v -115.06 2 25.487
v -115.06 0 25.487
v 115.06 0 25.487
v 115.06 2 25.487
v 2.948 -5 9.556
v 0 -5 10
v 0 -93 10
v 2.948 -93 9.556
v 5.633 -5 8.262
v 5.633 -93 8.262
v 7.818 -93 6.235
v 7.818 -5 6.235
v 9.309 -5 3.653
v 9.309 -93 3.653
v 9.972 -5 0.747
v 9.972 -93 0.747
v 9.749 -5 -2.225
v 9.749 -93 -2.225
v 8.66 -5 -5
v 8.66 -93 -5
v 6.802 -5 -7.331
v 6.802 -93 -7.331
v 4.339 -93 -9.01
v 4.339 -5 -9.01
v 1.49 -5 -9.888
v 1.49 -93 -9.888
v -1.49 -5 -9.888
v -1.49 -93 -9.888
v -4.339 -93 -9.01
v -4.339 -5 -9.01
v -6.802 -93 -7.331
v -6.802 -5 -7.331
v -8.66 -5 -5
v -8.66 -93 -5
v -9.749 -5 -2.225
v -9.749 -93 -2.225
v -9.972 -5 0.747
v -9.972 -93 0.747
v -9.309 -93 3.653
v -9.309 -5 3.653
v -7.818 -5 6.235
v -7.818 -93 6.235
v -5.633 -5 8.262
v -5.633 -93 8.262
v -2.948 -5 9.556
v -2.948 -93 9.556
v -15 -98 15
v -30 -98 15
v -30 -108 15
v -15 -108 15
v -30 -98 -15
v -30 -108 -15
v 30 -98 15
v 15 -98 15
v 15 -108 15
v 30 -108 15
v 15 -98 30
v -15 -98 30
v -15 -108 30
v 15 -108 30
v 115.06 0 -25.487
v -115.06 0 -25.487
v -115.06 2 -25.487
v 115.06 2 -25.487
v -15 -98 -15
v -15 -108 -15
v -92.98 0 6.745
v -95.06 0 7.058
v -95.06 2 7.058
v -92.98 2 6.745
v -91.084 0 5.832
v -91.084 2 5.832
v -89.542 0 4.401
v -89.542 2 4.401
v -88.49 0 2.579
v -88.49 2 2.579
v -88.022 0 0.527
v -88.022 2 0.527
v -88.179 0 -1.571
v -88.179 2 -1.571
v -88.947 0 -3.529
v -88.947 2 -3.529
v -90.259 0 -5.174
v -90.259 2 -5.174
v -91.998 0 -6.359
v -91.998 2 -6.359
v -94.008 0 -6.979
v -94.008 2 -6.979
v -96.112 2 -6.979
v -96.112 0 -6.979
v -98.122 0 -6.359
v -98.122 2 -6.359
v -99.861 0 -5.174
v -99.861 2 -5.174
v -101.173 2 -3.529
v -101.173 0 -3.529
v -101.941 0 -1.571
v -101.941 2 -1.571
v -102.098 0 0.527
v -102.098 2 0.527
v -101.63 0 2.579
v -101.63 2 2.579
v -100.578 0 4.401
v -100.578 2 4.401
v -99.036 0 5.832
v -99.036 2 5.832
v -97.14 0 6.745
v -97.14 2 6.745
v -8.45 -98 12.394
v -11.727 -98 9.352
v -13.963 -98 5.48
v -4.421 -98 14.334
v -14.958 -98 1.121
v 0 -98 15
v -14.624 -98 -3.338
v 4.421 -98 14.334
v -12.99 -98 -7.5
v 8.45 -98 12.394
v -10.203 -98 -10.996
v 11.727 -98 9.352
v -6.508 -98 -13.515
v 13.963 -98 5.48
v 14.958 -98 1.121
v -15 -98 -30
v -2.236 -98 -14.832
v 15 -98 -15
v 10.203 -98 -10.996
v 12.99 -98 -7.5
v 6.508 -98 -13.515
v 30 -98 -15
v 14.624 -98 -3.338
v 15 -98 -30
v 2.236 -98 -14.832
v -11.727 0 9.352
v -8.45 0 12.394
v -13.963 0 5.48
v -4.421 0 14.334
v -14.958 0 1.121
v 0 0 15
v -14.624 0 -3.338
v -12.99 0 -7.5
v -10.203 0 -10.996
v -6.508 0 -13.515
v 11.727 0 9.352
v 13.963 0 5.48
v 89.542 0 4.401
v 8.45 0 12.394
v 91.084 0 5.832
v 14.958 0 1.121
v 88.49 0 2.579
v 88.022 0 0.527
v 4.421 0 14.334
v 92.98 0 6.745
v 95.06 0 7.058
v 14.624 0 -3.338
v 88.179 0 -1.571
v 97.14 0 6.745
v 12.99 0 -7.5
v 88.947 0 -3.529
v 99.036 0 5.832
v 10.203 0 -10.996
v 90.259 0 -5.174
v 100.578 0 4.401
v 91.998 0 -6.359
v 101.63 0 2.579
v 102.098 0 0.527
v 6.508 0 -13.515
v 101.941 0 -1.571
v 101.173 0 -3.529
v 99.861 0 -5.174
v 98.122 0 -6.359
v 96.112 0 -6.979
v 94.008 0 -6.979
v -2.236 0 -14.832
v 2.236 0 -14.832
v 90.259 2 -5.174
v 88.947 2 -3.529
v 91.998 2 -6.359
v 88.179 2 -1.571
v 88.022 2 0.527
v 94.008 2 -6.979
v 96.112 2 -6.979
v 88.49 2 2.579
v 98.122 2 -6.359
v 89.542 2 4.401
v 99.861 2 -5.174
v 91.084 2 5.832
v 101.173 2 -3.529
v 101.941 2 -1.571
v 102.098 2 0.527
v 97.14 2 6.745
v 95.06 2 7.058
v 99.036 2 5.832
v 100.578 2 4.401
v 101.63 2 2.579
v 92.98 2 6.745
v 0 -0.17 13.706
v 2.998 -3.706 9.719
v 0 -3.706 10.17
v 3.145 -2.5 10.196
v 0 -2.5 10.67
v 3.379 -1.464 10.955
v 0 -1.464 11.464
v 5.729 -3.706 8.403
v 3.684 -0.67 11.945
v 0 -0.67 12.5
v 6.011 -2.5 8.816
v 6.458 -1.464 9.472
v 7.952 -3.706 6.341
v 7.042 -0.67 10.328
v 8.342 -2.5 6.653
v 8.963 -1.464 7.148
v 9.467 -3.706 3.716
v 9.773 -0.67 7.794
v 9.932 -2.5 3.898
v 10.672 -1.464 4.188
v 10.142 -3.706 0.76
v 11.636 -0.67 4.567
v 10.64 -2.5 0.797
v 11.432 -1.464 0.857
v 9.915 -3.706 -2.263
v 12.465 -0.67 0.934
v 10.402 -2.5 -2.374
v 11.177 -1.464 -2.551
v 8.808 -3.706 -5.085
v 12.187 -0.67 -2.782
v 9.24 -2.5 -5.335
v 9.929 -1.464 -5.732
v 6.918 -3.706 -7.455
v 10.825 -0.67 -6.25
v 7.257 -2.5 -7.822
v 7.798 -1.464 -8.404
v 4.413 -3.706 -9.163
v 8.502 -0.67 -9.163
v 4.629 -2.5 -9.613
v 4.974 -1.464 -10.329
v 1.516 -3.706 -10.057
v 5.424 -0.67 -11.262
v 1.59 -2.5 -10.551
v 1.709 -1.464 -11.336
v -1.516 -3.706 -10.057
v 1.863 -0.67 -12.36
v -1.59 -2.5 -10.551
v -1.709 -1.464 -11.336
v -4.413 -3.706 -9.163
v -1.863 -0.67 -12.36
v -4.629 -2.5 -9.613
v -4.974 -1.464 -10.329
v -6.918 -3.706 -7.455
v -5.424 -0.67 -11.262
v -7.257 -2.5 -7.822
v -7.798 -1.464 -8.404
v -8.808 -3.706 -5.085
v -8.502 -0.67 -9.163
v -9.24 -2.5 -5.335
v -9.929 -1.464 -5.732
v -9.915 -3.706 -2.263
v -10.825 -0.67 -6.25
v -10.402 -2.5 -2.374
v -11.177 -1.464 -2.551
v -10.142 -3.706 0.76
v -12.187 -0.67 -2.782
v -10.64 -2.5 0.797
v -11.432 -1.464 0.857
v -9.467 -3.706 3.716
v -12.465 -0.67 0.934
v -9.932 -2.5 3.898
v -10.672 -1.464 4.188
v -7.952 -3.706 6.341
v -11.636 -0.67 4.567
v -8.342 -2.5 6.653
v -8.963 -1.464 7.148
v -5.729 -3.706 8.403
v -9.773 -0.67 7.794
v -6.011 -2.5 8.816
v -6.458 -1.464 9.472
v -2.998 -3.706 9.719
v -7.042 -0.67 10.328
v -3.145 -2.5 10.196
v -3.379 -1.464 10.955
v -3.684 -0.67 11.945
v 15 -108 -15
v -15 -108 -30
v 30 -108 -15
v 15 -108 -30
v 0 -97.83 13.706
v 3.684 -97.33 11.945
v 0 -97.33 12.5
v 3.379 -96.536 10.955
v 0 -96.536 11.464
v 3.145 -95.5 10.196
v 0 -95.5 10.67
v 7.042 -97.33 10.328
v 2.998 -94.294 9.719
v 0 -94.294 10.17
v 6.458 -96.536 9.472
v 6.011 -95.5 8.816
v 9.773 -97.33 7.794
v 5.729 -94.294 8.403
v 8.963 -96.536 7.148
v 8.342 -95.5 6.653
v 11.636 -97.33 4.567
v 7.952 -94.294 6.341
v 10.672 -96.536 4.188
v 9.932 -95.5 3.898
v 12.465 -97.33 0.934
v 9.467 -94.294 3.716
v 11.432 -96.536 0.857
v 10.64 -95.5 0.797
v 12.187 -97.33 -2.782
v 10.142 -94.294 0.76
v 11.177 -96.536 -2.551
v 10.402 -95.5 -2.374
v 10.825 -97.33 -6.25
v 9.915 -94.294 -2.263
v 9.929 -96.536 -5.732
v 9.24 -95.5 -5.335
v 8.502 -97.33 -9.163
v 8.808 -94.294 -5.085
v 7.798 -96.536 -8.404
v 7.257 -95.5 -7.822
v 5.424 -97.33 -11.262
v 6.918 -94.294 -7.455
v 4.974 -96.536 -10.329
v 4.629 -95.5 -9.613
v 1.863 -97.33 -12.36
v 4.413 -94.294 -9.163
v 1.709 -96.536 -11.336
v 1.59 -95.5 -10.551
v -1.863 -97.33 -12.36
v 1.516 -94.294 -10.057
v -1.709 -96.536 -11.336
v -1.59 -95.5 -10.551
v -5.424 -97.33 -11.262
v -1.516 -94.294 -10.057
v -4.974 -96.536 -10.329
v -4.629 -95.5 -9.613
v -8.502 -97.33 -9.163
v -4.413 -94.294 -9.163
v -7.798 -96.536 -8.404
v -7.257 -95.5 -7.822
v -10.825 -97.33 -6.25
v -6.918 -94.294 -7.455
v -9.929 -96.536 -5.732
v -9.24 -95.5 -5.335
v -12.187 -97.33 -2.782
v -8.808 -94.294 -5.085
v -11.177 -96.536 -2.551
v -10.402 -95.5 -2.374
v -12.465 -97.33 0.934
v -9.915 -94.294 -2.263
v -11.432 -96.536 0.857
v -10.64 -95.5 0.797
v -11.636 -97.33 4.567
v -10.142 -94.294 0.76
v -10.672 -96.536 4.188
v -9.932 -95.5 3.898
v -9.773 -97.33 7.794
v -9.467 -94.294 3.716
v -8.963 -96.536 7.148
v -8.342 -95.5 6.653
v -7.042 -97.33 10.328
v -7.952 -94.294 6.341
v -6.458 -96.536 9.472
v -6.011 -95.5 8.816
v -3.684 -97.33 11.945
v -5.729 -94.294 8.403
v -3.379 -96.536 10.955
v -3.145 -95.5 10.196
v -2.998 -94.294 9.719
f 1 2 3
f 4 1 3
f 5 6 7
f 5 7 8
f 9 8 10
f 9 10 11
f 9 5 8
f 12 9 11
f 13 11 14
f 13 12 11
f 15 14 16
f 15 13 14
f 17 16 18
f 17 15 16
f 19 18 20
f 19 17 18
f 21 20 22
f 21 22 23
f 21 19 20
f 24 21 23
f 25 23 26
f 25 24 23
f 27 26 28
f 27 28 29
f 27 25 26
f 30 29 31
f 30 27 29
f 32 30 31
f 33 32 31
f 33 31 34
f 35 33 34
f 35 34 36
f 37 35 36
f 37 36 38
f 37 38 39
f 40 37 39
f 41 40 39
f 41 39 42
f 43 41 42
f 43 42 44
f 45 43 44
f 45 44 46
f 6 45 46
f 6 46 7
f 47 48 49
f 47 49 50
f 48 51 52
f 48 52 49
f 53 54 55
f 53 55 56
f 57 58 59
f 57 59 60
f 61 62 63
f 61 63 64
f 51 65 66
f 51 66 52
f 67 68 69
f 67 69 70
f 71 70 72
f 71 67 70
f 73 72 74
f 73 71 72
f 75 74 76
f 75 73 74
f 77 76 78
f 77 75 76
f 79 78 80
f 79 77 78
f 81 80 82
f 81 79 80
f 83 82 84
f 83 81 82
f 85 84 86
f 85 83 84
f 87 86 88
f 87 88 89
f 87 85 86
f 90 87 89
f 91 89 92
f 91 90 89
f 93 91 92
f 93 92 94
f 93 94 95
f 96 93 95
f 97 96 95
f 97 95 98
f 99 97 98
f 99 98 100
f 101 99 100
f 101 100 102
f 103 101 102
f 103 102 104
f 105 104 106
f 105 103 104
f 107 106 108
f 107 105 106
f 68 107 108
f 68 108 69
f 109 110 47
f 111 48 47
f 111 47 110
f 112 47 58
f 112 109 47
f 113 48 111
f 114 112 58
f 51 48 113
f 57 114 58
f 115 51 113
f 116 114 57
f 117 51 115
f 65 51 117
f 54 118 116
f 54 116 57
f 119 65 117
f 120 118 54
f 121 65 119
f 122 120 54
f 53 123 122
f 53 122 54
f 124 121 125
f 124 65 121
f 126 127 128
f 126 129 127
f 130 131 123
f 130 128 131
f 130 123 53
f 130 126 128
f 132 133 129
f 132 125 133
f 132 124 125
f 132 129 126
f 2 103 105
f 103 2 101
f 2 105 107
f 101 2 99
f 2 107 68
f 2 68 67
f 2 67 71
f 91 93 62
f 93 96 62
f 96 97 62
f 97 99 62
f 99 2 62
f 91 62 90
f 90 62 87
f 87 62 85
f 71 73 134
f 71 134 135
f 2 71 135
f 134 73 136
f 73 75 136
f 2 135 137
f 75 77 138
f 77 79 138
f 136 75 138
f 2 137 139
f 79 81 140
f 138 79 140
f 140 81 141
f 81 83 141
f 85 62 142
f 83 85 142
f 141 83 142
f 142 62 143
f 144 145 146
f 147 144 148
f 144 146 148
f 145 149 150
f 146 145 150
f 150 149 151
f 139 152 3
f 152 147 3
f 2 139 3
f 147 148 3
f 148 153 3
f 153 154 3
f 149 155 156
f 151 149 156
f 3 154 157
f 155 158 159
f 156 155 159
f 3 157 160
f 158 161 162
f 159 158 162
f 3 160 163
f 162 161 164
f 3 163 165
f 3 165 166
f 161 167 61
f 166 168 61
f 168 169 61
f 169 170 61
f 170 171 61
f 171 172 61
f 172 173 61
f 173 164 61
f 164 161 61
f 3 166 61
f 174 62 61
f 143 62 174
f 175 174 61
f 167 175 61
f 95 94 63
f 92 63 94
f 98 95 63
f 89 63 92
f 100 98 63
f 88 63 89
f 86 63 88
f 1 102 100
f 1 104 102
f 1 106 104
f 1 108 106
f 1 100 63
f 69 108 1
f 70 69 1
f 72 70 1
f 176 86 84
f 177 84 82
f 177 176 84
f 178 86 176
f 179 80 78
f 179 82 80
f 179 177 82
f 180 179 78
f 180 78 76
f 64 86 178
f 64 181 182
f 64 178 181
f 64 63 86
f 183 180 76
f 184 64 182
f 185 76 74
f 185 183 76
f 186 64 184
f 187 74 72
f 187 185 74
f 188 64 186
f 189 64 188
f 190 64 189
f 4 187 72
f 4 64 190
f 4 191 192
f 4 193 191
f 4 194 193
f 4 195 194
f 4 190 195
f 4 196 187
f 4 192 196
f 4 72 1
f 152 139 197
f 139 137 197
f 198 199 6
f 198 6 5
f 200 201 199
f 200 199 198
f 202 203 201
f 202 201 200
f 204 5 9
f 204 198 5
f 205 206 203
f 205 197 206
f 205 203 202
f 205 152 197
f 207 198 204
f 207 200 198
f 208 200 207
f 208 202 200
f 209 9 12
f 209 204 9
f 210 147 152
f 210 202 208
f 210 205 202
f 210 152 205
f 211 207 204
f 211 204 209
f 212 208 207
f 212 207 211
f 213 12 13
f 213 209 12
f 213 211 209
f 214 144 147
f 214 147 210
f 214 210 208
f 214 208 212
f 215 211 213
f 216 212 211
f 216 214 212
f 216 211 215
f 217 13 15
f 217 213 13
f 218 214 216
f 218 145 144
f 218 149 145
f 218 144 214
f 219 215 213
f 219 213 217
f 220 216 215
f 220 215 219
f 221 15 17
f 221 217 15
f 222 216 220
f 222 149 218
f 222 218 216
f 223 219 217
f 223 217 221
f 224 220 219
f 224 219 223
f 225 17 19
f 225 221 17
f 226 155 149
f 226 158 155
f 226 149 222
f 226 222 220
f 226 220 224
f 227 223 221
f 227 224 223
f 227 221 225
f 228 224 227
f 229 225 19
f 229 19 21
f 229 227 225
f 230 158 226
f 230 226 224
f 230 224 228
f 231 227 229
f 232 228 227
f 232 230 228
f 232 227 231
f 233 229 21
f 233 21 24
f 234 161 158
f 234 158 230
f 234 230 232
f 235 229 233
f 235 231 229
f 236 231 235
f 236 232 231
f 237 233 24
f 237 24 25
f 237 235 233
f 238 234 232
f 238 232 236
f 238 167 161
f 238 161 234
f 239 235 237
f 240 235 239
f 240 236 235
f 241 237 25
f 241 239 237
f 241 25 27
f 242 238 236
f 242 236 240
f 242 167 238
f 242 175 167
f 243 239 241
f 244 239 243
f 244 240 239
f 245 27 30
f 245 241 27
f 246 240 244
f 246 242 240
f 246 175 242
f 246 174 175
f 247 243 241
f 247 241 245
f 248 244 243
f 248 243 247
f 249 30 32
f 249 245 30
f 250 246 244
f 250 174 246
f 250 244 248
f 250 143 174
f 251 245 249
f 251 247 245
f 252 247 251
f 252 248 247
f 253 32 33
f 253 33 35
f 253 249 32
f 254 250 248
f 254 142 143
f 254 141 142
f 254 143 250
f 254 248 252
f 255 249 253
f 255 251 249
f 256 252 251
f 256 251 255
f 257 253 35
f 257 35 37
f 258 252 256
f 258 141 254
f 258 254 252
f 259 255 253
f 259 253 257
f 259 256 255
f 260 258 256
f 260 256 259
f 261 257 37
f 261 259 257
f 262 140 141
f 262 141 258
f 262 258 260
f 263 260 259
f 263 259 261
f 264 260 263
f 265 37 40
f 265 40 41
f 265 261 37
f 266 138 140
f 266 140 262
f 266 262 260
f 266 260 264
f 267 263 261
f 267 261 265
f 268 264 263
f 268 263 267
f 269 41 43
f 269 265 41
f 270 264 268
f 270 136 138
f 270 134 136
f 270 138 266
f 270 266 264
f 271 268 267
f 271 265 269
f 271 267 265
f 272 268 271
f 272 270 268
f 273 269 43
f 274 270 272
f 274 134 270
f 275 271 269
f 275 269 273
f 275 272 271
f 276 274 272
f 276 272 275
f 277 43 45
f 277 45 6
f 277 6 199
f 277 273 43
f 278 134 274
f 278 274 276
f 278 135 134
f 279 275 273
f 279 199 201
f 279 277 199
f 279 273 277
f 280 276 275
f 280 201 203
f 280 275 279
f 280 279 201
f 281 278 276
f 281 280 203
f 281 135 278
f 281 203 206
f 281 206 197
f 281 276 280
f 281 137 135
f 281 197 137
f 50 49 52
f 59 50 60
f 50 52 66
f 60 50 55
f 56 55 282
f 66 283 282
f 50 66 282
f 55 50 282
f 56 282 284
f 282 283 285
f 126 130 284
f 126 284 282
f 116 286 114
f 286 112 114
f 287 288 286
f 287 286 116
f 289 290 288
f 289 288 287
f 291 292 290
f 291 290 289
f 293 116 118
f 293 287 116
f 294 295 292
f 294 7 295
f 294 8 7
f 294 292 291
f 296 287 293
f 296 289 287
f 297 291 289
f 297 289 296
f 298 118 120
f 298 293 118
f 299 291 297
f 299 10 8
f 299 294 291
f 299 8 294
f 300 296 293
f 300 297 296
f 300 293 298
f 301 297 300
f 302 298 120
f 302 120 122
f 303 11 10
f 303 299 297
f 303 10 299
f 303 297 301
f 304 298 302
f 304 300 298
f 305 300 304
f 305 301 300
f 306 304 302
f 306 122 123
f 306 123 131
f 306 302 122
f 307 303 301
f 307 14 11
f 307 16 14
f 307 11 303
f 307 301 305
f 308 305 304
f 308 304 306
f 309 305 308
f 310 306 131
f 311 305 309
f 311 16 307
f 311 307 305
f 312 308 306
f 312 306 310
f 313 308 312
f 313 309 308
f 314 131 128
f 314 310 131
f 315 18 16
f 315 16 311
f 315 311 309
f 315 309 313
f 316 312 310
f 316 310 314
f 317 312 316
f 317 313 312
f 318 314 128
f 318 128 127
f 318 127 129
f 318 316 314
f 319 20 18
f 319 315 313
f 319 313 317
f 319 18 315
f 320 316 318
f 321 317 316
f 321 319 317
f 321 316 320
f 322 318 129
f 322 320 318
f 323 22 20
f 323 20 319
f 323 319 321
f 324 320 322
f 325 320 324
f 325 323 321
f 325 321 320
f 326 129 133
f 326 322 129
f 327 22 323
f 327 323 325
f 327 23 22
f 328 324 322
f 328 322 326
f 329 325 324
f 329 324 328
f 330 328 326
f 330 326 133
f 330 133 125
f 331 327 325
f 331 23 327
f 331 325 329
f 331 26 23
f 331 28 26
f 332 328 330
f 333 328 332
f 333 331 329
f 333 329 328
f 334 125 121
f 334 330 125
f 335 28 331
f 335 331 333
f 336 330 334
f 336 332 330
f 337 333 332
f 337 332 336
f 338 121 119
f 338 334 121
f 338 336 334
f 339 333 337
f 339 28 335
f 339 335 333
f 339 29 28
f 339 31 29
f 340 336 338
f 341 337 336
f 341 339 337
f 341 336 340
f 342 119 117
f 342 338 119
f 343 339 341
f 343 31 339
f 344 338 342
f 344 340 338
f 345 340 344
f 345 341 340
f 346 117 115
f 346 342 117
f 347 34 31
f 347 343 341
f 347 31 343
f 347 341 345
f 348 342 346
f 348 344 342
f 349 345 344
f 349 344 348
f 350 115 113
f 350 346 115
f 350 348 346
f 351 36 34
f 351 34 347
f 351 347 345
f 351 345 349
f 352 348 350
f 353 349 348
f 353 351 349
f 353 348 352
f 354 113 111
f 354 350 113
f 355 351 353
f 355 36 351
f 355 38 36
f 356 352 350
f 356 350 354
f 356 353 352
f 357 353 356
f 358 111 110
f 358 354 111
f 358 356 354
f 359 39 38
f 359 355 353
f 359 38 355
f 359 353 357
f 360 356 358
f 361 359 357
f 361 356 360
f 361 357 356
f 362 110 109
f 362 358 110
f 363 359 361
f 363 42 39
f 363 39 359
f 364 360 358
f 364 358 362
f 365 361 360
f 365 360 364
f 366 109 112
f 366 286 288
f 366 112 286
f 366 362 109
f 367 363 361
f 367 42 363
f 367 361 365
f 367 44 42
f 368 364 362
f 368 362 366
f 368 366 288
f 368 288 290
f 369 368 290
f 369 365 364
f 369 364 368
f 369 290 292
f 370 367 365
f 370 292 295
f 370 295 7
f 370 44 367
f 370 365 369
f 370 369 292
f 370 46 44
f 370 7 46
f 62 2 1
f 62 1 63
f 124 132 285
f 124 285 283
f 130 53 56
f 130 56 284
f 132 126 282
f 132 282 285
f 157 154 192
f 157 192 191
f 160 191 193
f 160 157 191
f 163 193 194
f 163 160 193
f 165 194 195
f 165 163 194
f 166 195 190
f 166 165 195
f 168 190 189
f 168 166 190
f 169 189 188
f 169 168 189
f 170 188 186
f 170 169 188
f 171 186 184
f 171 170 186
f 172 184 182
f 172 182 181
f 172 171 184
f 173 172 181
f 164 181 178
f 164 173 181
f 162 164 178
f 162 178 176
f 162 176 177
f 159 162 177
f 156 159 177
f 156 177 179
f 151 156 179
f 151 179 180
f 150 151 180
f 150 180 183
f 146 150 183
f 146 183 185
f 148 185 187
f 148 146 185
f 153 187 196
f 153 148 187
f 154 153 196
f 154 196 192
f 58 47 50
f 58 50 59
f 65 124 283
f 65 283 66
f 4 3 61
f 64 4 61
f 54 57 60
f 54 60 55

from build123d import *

# Parameters (mm, degrees)
SKETCH1_W           = 230.12
SKETCH1_H           = 50.974909876
SKETCH1_R           = 7.058173785
BOSS_EXTRUDE1_DEPTH = 2
SKETCH2_R           = 10
BOSS_EXTRUDE2_DEPTH = 100
BOSS_EXTRUDE3_DEPTH = 10
FILLET1_R           = 5


with BuildPart() as part:
    # Sketch1 → Boss-Extrude1 (new body)
    with BuildSketch(Plane(origin=(0, 0, 0), x_dir=(1, 0, 0), z_dir=(0, 1, 0))):
        Rectangle(SKETCH1_W, SKETCH1_H)
        with Locations(Location((-95.06, 0, 0), (0, 0, 270))):
            Circle(SKETCH1_R, mode=Mode.SUBTRACT)
        with Locations(Location((95.06, 0, 0), (0, 0, 270))):
            Circle(SKETCH1_R, mode=Mode.SUBTRACT)
    extrude(amount=BOSS_EXTRUDE1_DEPTH)

    # Sketch2 → Boss-Extrude2 (add)
    with BuildSketch(Plane(origin=(0, 2, 0), x_dir=(1, 0, 0), z_dir=(0, 1, 0))):
        with Locations(Location((0, 0, 0), (0, 0, 270))):
            Circle(SKETCH2_R)
    extrude(amount=-BOSS_EXTRUDE2_DEPTH)

    # Sketch3 → Boss-Extrude3 (add)
    with BuildSketch(Plane(origin=(0, -98, 0), x_dir=(-1, 0, 0), z_dir=(0, -1, 0))):
        Polygon((15, 15), (30, 15), (30, -15), (15, -15), (15, -30), (-15, -30), (-15, -15), (-30, -15), (-30, 15), (-15, 15), (-15, 30), (15, 30), align=None)
    extrude(amount=BOSS_EXTRUDE3_DEPTH)

    # Fillet1
    fillet1_edges = [part.edges().sort_by_distance(p)[0] for p in [
        (0, 0, -10),
        (0, -98, -10),
    ]]
    fillet(fillet1_edges, radius=FILLET1_R)


solid = part.part
